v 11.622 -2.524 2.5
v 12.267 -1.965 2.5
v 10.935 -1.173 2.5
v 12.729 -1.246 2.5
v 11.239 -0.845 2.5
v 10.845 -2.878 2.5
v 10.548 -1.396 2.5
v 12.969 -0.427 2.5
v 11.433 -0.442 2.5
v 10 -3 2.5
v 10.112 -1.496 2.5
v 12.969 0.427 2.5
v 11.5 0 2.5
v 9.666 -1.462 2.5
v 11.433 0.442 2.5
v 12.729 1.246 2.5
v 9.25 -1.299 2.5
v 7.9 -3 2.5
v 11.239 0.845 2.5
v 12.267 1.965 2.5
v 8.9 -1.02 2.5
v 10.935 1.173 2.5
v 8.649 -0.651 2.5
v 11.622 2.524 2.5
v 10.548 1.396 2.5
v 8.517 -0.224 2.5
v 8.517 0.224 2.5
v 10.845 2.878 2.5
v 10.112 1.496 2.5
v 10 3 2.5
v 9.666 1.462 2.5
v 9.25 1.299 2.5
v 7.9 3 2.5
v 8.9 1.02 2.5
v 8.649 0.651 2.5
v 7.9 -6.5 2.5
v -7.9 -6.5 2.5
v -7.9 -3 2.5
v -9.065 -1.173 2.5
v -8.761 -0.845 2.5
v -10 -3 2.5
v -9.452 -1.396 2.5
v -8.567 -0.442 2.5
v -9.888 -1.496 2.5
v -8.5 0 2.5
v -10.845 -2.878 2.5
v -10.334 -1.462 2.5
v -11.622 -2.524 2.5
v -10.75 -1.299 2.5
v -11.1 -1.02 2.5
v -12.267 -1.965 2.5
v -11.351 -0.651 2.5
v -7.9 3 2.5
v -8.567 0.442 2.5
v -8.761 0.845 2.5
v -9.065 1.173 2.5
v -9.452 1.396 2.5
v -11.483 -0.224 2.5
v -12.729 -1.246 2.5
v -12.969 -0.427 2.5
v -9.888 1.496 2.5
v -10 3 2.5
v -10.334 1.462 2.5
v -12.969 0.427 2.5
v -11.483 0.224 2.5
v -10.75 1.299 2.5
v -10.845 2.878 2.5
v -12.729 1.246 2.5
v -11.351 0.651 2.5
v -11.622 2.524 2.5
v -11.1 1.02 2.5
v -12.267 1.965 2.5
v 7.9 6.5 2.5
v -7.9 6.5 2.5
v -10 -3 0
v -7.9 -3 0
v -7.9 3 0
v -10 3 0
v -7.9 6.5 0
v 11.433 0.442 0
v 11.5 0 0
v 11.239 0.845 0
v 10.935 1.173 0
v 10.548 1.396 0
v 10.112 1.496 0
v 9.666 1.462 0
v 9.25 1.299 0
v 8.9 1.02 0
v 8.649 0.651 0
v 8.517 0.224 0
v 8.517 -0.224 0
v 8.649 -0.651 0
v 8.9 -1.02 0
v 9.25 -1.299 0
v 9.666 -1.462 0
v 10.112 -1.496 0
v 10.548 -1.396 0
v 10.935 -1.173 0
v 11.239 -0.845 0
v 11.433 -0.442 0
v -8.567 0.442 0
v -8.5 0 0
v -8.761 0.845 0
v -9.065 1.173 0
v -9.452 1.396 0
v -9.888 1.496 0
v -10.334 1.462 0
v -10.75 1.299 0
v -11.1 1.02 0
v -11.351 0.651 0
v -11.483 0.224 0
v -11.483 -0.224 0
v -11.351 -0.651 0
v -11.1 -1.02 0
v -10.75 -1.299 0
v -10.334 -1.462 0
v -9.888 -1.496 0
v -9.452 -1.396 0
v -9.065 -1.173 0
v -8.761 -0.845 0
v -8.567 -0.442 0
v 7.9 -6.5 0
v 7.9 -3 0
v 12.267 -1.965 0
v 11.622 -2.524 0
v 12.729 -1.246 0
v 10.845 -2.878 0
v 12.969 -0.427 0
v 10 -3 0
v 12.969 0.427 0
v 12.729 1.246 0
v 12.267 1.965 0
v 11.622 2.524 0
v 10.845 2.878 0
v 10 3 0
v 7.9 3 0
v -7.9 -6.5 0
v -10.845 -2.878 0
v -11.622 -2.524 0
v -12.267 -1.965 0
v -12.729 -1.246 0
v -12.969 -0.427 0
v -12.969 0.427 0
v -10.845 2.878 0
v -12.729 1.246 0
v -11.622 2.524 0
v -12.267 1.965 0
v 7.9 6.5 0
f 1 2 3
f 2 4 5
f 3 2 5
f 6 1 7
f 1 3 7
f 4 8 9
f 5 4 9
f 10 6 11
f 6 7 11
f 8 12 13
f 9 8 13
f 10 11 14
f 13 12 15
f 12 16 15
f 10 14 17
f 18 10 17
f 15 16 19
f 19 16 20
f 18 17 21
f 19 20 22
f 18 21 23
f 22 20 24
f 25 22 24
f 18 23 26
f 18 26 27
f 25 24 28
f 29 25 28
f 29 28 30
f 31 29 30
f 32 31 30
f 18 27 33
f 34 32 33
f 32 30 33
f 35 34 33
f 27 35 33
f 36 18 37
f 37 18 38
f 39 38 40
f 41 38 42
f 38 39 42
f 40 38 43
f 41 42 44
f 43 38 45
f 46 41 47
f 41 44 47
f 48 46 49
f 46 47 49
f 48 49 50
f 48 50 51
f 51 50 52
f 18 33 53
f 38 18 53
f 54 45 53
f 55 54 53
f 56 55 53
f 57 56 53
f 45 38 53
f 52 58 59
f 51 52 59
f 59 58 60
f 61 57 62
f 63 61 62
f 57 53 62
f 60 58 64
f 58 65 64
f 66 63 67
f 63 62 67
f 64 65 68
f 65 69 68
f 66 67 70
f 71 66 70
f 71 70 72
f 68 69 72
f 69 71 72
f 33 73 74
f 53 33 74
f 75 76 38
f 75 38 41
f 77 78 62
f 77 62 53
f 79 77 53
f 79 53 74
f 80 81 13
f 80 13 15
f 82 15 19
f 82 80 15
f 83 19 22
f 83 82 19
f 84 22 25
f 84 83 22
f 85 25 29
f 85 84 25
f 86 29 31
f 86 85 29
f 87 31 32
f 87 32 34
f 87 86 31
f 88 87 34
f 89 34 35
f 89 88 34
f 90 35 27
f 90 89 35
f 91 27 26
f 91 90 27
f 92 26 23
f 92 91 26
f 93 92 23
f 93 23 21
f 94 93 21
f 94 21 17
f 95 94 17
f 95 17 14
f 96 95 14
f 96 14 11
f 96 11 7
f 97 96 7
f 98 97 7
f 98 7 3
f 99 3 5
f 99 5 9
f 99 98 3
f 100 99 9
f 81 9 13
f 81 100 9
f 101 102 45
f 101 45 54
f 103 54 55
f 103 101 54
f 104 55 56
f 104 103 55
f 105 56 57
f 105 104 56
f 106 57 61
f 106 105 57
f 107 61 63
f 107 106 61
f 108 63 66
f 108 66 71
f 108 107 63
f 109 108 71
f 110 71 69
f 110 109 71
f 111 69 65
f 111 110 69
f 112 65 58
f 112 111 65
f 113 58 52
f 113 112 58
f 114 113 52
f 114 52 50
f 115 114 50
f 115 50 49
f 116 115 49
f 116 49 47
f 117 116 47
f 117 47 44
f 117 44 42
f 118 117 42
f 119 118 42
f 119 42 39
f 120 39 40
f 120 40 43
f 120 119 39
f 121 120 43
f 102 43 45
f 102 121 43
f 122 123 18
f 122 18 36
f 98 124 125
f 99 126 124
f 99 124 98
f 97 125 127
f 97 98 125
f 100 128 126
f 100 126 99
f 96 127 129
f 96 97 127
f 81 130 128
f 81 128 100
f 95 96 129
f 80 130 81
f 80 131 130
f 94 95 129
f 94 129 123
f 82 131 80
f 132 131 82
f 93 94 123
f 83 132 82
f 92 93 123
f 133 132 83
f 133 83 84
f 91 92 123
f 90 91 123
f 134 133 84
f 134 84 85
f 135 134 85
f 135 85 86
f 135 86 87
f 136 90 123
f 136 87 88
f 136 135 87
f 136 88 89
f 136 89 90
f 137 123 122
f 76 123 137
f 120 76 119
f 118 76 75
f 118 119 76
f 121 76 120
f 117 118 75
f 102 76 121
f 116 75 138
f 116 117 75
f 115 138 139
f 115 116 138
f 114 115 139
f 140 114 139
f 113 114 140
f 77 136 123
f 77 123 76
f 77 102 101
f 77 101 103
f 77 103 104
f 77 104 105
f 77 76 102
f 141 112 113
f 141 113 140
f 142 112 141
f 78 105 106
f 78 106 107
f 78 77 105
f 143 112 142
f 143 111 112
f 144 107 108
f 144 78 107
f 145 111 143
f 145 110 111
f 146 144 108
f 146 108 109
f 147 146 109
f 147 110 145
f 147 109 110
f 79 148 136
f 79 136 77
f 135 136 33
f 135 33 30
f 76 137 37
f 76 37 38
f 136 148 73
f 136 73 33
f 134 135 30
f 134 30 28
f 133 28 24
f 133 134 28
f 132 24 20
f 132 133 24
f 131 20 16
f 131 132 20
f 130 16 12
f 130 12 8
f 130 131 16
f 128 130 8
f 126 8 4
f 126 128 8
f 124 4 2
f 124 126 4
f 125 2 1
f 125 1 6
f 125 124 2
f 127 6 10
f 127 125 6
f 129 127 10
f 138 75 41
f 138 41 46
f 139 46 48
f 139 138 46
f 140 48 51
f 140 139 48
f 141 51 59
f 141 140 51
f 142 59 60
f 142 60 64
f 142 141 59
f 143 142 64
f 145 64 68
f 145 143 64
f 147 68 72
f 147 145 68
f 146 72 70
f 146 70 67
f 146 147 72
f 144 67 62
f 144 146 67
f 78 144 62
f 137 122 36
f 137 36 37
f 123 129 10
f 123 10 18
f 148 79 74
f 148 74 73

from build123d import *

# Parameters (mm, degrees)
ESBO_O1_R                = 1.5
RESSALTO_EXTRUS_O1_DEPTH = 2.5


with BuildPart() as part:
    # Esboço1 → Ressalto-extrusão1 (new body)
    with BuildSketch(Plane.XY):
        with BuildLine():
            Line((-10, 3), (-7.9, 3))
            Line((-7.9, 3), (-7.9, 6.5))
            Line((-7.9, 6.5), (7.9, 6.5))
            Line((7.9, 6.5), (7.9, 3))
            Line((7.9, 3), (10, 3))
            ThreePointArc((10, 3), (13, 0), (10, -3))
            Line((10, -3), (7.9, -3))
            Line((7.9, -3), (7.9, -6.5))
            Line((7.9, -6.5), (-7.9, -6.5))
            Line((-7.9, -6.5), (-7.9, -3))
            Line((-7.9, -3), (-10, -3))
            ThreePointArc((-10, -3), (-13, 0), (-10, 3))
        make_face()
        with Locations((-10, 0)):
            Circle(ESBO_O1_R, mode=Mode.SUBTRACT)
        with Locations((10, 0)):
            Circle(ESBO_O1_R, mode=Mode.SUBTRACT)
    extrude(amount=RESSALTO_EXTRUS_O1_DEPTH)


solid = part.part
